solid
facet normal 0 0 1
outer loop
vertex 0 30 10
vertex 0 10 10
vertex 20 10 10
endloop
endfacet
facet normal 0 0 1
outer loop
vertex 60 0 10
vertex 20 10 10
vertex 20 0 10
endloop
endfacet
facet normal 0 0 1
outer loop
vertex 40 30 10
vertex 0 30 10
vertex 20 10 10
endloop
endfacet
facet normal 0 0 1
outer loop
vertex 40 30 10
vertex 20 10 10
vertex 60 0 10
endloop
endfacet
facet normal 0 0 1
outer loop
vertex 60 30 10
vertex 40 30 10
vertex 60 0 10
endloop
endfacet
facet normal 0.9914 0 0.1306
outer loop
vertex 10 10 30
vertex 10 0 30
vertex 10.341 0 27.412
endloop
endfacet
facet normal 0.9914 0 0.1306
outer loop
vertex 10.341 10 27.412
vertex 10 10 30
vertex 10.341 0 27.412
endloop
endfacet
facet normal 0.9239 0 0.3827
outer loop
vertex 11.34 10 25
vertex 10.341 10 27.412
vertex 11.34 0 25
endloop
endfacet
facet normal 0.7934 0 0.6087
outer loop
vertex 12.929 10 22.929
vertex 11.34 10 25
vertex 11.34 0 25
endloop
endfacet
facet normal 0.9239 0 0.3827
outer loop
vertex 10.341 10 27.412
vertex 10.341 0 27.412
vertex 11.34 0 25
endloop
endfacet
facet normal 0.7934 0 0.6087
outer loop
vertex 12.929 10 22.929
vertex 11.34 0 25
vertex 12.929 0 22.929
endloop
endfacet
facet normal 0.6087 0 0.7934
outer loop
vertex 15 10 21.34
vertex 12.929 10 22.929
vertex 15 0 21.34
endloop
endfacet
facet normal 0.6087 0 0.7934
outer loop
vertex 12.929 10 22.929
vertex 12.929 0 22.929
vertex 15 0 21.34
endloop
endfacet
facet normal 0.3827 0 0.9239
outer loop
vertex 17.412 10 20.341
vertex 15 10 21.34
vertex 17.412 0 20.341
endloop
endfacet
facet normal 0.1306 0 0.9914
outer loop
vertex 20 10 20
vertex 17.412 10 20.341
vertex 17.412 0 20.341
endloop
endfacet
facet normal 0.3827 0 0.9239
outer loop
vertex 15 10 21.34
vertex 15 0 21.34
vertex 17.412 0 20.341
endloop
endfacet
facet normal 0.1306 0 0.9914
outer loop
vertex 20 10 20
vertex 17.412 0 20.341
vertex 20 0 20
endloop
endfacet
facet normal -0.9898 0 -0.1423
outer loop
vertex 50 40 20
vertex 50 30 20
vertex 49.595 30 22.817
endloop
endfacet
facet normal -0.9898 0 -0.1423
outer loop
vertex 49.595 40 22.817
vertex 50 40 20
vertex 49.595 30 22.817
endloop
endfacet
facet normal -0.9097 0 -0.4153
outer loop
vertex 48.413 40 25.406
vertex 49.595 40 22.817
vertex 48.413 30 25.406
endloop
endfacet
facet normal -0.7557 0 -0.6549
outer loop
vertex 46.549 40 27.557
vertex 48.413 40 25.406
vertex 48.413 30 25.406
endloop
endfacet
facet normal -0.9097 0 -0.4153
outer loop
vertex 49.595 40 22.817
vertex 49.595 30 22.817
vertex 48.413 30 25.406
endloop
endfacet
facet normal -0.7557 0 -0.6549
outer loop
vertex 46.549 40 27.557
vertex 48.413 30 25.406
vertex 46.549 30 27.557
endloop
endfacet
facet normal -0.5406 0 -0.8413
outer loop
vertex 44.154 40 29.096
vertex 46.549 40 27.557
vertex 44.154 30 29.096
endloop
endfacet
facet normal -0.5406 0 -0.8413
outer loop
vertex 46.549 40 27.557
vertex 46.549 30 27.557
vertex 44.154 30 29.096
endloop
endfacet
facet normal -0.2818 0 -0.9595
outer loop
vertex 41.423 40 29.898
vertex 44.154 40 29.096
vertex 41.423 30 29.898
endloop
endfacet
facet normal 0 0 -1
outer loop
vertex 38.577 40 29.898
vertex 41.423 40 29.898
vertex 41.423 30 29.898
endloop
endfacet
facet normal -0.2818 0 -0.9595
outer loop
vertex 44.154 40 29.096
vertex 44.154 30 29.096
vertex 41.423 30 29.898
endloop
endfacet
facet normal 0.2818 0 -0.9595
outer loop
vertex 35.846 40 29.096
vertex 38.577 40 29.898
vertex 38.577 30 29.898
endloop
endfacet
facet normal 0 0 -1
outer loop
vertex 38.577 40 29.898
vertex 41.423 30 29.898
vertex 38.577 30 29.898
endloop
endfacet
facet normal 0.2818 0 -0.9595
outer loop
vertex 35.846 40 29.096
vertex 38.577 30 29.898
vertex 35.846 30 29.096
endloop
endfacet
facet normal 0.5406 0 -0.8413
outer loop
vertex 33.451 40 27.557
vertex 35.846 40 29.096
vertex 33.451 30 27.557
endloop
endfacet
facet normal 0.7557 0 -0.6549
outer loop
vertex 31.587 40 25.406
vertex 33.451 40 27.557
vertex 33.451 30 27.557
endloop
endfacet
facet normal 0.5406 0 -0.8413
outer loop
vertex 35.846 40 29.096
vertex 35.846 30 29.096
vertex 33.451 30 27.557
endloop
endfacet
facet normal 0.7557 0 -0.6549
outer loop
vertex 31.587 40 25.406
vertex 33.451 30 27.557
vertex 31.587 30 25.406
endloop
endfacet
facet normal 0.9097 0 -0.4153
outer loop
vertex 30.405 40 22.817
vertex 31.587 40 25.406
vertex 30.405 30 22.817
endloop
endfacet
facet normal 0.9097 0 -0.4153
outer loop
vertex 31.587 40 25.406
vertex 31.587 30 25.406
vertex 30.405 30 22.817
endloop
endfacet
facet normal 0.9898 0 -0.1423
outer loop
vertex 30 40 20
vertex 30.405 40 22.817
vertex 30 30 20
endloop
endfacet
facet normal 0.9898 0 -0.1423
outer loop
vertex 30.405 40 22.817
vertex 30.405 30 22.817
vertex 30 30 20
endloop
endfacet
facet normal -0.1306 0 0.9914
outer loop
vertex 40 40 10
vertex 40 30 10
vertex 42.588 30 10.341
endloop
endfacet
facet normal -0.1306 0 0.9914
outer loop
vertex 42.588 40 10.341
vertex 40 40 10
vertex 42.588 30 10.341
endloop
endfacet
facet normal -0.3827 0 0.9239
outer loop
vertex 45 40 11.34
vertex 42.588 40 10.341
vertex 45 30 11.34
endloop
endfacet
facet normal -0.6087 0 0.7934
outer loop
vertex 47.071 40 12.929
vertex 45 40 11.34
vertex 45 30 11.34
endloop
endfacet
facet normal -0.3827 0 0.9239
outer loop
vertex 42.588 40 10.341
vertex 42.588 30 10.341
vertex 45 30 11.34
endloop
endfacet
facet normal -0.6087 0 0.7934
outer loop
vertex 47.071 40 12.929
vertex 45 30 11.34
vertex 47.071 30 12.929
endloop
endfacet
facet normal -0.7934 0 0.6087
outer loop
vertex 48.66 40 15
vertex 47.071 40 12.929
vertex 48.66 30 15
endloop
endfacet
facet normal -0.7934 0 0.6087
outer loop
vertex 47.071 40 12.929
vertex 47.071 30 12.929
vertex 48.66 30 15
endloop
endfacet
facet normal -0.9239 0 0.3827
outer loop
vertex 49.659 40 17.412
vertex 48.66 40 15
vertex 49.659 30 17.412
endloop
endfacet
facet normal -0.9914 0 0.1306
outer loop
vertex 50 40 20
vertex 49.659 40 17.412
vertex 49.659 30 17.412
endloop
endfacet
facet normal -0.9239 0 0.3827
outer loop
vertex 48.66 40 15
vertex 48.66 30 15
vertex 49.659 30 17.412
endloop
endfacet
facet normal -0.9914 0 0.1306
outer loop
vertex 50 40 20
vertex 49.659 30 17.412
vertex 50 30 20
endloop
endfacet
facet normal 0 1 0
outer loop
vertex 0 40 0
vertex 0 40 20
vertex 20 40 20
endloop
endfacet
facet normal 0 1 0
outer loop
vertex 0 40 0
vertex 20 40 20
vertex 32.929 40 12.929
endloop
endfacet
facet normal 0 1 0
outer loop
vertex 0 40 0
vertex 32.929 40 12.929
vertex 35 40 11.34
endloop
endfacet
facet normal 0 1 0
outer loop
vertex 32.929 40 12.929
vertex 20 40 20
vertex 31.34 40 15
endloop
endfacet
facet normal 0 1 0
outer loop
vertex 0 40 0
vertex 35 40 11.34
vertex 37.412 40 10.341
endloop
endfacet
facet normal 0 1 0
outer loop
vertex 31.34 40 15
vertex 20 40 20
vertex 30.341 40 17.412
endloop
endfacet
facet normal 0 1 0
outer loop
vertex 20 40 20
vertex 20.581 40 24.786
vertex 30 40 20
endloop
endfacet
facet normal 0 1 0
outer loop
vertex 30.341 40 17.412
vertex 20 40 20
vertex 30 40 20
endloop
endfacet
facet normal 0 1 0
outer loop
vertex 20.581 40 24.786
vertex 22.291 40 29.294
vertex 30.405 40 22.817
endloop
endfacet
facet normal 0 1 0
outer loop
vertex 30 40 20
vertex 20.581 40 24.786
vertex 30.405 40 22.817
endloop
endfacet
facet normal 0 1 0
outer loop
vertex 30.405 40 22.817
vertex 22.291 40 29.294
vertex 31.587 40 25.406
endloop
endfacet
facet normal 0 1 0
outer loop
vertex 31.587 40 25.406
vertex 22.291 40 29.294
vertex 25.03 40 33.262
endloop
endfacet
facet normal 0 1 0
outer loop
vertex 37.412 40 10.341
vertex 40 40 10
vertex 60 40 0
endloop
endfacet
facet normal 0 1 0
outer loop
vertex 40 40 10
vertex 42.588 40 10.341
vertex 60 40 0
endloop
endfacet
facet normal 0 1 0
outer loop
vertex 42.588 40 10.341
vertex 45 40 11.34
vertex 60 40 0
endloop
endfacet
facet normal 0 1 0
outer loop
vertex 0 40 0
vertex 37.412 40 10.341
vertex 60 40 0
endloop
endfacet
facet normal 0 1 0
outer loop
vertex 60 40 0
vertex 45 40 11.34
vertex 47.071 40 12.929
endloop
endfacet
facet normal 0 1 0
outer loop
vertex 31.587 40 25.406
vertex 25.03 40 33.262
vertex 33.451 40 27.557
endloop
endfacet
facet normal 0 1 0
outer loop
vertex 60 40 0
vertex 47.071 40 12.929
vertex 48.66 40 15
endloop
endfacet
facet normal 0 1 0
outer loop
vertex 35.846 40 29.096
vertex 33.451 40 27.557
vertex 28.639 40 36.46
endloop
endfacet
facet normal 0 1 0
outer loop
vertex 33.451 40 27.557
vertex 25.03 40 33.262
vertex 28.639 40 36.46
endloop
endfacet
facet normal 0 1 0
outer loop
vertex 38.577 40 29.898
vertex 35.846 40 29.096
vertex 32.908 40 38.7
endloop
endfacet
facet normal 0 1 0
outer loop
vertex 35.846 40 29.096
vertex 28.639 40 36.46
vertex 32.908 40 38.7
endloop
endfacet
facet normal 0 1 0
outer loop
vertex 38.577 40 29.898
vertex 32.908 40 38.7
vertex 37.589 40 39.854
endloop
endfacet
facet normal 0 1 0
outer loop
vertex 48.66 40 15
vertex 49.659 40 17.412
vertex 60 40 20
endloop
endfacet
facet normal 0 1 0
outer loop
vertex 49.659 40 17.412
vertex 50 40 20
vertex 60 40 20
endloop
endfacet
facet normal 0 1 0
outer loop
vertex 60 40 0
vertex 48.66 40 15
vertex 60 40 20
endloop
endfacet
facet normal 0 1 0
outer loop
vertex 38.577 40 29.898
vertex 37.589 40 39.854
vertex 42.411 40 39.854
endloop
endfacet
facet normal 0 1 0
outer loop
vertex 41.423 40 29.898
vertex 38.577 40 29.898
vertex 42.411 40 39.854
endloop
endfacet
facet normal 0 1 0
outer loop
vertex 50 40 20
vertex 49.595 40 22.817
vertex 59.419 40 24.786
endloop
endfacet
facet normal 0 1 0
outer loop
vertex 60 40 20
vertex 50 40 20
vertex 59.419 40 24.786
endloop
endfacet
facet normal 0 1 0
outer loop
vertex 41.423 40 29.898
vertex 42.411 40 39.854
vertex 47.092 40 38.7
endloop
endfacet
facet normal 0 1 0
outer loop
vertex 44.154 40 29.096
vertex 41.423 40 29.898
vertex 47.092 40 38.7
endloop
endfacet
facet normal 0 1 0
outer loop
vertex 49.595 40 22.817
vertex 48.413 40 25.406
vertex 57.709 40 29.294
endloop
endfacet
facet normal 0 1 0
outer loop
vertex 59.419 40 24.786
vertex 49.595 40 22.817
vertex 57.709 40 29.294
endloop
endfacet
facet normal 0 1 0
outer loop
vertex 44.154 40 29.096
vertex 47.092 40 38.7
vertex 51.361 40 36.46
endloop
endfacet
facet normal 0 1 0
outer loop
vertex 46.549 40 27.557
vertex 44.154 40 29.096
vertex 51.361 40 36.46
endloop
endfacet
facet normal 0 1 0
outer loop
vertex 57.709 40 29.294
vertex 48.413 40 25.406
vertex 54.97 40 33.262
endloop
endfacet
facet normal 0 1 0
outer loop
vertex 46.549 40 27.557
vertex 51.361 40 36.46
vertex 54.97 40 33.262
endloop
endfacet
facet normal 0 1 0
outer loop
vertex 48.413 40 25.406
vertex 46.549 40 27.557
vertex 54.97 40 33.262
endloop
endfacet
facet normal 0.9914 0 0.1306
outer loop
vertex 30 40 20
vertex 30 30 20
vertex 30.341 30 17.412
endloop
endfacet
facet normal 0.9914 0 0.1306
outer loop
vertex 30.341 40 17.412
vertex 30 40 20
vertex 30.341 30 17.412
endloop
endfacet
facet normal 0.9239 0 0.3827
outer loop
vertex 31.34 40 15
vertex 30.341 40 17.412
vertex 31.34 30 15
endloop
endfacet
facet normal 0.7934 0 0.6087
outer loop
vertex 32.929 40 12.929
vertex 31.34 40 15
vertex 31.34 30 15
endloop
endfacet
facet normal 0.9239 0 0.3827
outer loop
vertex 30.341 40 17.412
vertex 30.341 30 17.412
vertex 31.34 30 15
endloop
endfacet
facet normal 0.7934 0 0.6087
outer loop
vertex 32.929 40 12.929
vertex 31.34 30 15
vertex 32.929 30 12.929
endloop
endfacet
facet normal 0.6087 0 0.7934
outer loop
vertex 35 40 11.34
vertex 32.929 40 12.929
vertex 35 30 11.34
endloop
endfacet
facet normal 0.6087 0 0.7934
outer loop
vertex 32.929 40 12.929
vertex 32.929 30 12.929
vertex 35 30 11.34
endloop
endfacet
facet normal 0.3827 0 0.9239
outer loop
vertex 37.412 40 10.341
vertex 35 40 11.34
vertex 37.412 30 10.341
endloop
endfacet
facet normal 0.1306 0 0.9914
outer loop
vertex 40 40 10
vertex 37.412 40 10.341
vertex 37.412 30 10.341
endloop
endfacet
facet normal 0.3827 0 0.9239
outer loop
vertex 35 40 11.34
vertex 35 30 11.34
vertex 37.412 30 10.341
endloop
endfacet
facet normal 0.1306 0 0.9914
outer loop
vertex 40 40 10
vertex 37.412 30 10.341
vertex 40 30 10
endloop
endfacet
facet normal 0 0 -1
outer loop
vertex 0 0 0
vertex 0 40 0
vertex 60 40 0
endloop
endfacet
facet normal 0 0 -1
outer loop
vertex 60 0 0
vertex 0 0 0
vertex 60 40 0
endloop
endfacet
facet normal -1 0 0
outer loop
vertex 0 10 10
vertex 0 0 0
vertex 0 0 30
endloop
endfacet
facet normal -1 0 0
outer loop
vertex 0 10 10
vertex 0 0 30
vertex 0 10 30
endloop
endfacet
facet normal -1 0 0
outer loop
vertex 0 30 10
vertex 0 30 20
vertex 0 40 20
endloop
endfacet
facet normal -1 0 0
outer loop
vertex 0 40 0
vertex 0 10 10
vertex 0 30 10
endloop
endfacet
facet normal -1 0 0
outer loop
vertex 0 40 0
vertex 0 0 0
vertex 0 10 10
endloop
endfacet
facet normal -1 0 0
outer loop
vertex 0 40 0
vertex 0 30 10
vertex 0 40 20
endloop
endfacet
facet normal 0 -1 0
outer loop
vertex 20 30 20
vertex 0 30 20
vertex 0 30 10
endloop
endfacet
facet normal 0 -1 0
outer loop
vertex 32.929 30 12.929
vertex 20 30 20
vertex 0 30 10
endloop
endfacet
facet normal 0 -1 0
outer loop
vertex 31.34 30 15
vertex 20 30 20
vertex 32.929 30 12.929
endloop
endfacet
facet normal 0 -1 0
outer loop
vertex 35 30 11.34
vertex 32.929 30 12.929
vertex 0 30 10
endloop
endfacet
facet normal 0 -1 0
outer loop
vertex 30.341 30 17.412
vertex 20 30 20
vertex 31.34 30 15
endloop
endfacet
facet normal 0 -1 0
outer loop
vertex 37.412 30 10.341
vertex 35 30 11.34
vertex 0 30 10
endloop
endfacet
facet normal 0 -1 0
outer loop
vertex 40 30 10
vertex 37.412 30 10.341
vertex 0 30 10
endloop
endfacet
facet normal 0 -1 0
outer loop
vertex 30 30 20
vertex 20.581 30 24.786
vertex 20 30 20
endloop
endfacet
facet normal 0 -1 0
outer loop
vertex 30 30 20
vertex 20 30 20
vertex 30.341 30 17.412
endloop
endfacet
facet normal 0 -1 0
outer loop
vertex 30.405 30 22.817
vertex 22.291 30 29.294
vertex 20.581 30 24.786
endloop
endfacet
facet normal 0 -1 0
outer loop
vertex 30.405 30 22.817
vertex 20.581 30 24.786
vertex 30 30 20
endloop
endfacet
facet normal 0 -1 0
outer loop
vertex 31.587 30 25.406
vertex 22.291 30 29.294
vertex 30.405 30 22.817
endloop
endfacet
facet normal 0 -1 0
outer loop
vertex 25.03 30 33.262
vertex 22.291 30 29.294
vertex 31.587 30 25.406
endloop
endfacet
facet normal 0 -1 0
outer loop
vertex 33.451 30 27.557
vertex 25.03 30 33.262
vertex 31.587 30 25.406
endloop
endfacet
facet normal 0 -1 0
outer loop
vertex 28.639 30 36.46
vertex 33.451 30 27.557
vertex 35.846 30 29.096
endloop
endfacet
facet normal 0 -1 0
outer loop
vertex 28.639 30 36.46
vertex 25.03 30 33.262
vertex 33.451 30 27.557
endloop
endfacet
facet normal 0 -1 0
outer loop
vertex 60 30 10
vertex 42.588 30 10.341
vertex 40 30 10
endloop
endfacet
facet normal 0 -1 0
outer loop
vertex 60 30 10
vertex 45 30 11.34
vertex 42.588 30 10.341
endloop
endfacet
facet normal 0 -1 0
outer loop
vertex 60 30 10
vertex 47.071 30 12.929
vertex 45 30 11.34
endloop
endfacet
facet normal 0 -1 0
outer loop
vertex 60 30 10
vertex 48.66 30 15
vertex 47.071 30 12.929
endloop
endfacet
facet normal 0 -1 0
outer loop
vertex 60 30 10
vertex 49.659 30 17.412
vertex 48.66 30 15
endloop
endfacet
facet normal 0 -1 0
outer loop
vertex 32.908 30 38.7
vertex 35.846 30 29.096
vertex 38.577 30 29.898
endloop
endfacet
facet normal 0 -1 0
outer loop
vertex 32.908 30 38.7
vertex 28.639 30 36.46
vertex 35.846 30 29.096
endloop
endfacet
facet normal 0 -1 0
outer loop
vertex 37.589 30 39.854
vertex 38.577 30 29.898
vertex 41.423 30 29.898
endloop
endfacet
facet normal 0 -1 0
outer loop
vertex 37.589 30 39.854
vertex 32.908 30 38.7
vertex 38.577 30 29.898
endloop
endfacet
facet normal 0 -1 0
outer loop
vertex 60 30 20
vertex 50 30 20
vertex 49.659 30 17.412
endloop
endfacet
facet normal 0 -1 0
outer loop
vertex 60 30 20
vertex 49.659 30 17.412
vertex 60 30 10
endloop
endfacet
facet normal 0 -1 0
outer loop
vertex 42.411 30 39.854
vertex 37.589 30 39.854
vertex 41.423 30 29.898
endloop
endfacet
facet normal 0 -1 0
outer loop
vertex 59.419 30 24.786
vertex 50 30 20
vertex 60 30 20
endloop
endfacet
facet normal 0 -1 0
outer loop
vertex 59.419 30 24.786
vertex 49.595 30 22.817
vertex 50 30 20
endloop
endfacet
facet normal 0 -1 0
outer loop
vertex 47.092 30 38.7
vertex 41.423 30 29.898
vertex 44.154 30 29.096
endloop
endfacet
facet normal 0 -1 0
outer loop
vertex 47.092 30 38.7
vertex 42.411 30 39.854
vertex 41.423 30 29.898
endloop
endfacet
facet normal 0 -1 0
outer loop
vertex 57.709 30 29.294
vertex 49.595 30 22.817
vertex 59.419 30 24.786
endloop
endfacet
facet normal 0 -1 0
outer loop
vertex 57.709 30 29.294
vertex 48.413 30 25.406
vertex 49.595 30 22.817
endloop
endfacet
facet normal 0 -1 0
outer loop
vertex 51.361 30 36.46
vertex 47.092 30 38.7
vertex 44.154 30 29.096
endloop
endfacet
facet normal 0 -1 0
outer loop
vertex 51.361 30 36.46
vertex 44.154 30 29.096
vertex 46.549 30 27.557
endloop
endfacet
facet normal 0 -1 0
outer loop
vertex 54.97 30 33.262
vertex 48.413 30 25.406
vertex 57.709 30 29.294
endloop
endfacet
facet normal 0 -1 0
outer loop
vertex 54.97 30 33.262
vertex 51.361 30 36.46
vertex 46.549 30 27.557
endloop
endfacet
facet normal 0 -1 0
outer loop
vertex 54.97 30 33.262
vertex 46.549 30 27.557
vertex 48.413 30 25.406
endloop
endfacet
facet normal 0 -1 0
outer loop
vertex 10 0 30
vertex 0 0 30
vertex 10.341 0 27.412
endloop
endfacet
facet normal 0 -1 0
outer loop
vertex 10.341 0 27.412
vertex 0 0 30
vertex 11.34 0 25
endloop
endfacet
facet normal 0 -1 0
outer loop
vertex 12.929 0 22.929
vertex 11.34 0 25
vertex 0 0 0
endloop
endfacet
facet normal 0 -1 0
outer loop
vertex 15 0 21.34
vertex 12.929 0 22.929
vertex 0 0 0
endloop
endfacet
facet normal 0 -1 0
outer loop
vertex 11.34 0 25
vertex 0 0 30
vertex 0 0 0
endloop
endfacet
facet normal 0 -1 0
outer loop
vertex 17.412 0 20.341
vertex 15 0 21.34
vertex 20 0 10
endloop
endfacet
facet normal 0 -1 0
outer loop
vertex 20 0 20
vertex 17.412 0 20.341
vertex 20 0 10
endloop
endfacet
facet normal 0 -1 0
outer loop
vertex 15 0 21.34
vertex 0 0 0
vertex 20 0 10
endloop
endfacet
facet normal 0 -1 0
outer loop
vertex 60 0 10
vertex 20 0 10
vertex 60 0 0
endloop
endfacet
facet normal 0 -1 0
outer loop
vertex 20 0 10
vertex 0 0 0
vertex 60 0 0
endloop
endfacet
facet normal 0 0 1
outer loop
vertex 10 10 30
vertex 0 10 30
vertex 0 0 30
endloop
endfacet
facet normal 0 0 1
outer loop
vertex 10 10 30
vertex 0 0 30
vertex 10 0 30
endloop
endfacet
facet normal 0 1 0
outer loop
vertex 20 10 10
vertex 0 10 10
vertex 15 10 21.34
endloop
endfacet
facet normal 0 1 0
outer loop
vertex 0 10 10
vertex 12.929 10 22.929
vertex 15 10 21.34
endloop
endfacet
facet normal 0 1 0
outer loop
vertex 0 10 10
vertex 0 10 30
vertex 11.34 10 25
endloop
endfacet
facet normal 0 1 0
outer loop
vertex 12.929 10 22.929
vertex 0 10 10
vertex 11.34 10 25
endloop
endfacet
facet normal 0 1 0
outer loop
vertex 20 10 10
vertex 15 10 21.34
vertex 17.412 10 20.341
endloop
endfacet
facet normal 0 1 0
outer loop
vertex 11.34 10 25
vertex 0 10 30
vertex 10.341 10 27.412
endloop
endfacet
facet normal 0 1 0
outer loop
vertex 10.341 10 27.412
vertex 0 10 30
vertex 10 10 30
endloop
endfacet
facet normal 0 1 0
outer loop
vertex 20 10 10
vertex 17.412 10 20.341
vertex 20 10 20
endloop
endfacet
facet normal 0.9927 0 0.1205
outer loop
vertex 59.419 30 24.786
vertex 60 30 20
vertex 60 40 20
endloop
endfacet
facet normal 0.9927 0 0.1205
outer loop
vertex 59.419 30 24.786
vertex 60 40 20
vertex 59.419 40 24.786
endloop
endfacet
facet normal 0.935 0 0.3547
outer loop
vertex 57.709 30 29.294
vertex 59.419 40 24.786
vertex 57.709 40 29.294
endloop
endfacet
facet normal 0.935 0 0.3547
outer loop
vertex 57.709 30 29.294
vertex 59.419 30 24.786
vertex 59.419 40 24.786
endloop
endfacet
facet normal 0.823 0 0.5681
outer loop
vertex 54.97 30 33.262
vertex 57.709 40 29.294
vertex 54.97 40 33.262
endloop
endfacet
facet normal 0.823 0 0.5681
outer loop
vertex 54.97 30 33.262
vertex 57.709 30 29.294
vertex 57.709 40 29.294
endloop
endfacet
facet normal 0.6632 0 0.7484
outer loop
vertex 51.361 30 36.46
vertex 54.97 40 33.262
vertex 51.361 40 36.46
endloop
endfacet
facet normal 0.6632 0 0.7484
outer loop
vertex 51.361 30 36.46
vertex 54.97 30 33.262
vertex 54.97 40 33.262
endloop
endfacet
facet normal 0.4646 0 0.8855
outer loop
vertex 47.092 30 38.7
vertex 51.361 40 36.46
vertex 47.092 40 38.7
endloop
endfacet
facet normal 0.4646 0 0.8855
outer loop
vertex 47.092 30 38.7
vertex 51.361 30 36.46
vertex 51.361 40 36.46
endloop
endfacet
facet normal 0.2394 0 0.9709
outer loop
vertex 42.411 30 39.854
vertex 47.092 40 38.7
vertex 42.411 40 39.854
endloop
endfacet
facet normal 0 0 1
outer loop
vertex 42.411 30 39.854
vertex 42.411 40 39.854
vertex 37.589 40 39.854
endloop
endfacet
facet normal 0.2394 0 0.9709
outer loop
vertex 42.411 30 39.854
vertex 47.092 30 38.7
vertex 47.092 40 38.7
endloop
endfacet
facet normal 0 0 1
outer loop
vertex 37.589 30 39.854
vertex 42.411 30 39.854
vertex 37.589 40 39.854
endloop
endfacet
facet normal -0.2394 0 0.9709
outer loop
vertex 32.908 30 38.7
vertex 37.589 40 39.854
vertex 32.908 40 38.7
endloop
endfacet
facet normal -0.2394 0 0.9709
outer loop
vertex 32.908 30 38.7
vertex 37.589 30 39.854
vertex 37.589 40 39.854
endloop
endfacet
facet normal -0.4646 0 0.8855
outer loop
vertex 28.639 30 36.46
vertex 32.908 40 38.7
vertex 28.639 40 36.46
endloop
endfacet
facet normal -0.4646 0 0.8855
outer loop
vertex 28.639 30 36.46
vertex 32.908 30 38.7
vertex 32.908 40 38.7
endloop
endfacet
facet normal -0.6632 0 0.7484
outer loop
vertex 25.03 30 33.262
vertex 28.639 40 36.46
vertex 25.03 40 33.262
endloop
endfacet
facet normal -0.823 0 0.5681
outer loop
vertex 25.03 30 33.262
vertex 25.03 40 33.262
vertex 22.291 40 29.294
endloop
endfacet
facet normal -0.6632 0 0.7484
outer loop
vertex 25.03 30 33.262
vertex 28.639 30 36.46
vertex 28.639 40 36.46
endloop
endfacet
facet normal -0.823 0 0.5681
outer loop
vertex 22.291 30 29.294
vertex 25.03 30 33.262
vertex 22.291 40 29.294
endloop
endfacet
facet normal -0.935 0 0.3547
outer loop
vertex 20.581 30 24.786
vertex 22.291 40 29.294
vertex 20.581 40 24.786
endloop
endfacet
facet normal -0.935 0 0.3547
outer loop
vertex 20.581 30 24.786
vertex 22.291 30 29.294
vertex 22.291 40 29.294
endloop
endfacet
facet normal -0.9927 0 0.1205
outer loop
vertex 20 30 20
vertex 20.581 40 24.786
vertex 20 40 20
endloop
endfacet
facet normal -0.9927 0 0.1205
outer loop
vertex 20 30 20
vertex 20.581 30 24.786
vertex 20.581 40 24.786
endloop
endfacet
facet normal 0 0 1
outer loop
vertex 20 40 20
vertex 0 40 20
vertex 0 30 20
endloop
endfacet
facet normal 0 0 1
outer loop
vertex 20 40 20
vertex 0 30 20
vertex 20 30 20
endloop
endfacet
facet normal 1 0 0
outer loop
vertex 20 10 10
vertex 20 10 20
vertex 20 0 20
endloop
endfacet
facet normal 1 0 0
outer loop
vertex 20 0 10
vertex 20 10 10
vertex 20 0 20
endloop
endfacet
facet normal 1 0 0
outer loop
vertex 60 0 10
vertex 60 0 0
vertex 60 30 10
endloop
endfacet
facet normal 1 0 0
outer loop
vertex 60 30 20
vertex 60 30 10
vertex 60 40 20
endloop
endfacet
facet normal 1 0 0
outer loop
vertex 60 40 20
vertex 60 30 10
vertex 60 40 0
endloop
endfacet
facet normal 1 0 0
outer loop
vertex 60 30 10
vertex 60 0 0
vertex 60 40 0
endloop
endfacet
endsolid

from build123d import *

# Parameters (mm, degrees)
F0_W      = 60
F0_H      = 40
F1_DEPTH  = 30
F3_DEPTH  = 20
F4_W      = 20
F4_H      = 10
F5_DEPTH  = 10
F6_W      = 40
F6_H      = 10
F7_DEPTH  = 25
F9_DEPTH  = 10
F11_DEPTH = 11
F13_DEPTH = 15
F16_DEPTH = 10
F18_DEPTH = 25


with BuildPart() as f1:
    # F0 (on Top) → F1 (new body)
    with BuildSketch(Plane.XY):
        with Locations((30, 20)):
            Rectangle(F0_W, F0_H)
    extrude(amount=F1_DEPTH)

    # F2 (on face) → F3 (cut)
    with BuildSketch(Plane.XY.offset(30)):
        Polygon((20, 10), (20, 0), (60, 0), (60, 30), (0, 30), (0, 10), align=None)
    extrude(amount=-F3_DEPTH, mode=Mode.SUBTRACT)

    # F4 (on face) → F5 (cut)
    with BuildSketch(Plane.XY.offset(30)):
        with Locations((10, 35)):
            Rectangle(F4_W, F4_H)
    extrude(amount=-F5_DEPTH, mode=Mode.SUBTRACT)

    # F6 (on face) → F7 (cut)
    with BuildSketch(Plane.XZ.offset(-30)):
        with Locations((40, 25)):
            Rectangle(F6_W, F6_H)
    extrude(amount=-F7_DEPTH, mode=Mode.SUBTRACT)

    # F10 (on face) → F11 (cut)
    with BuildSketch(Plane.XZ):
        with BuildLine():
            Line((20, 30), (10, 30))
            ThreePointArc((10, 30), (12.9289321881, 22.9289321881), (20, 20))
            Line((20, 20), (20, 30))
        make_face()
    extrude(amount=-F11_DEPTH, mode=Mode.SUBTRACT)


with BuildPart() as f9:
    # F8 (on face) → F9 (new body)
    with BuildSketch(Plane.XZ.offset(-30)):
        with BuildLine():
            Line((20.0364161283, 20), (60, 20))
            ThreePointArc((60, 20), (40.0182080641, 40.8581650258), (20.0364161283, 20))
        make_face()
    extrude(amount=-F9_DEPTH)


with BuildPart() as f13_tool:
    # F12 (on face) → F13 (new body)
    with BuildSketch(Plane.XZ.offset(-30)):
        with BuildLine():
            ThreePointArc((30, 20), (32.9289321881, 12.9289321881), (40, 10))
            ThreePointArc((40, 10), (47.0710678119, 12.9289321881), (50, 20))
            Line((50, 20), (40, 20))
            Line((40, 20), (30, 20))
        make_face()
        with BuildLine():
            Line((40, 20), (50, 20))
            ThreePointArc((50, 20), (40, 30), (30, 20))
            Line((30, 20), (40, 20))
        make_face()
    extrude(amount=-F13_DEPTH)


with BuildPart() as f1_1:
    add(f1.part)

    # F13: cut by f13_tool
    add(f13_tool.part, mode=Mode.SUBTRACT)

    # F15 (on face) → F16 (join)
    with BuildSketch(Plane.XZ.offset(-30)):
        with BuildLine():
            Line((50, 20), (60, 20))
            ThreePointArc((60, 20), (40, 40), (20, 20))
            Line((20, 20), (30, 20))
            Line((30, 20), (50, 20))
        make_face()
    extrude(amount=-F16_DEPTH)

    # F17 (on face) → F18 (cut)
    with BuildSketch(Plane.XZ.offset(-30)):
        with BuildLine():
            Line((30, 20), (50, 20))
            ThreePointArc((50, 20), (40, 30), (30, 20))
        make_face()
        with BuildLine():
            ThreePointArc((40, 10), (47.0710678119, 12.9289321881), (50, 20))
            Line((50, 20), (30, 20))
            ThreePointArc((30, 20), (32.9289321881, 12.9289321881), (40, 10))
        make_face()
    extrude(amount=-F18_DEPTH, mode=Mode.SUBTRACT)


with BuildPart() as f9_1:
    add(f9.part)

    # F13: cut by f13_tool
    add(f13_tool.part, mode=Mode.SUBTRACT)


solid = f1_1.part
